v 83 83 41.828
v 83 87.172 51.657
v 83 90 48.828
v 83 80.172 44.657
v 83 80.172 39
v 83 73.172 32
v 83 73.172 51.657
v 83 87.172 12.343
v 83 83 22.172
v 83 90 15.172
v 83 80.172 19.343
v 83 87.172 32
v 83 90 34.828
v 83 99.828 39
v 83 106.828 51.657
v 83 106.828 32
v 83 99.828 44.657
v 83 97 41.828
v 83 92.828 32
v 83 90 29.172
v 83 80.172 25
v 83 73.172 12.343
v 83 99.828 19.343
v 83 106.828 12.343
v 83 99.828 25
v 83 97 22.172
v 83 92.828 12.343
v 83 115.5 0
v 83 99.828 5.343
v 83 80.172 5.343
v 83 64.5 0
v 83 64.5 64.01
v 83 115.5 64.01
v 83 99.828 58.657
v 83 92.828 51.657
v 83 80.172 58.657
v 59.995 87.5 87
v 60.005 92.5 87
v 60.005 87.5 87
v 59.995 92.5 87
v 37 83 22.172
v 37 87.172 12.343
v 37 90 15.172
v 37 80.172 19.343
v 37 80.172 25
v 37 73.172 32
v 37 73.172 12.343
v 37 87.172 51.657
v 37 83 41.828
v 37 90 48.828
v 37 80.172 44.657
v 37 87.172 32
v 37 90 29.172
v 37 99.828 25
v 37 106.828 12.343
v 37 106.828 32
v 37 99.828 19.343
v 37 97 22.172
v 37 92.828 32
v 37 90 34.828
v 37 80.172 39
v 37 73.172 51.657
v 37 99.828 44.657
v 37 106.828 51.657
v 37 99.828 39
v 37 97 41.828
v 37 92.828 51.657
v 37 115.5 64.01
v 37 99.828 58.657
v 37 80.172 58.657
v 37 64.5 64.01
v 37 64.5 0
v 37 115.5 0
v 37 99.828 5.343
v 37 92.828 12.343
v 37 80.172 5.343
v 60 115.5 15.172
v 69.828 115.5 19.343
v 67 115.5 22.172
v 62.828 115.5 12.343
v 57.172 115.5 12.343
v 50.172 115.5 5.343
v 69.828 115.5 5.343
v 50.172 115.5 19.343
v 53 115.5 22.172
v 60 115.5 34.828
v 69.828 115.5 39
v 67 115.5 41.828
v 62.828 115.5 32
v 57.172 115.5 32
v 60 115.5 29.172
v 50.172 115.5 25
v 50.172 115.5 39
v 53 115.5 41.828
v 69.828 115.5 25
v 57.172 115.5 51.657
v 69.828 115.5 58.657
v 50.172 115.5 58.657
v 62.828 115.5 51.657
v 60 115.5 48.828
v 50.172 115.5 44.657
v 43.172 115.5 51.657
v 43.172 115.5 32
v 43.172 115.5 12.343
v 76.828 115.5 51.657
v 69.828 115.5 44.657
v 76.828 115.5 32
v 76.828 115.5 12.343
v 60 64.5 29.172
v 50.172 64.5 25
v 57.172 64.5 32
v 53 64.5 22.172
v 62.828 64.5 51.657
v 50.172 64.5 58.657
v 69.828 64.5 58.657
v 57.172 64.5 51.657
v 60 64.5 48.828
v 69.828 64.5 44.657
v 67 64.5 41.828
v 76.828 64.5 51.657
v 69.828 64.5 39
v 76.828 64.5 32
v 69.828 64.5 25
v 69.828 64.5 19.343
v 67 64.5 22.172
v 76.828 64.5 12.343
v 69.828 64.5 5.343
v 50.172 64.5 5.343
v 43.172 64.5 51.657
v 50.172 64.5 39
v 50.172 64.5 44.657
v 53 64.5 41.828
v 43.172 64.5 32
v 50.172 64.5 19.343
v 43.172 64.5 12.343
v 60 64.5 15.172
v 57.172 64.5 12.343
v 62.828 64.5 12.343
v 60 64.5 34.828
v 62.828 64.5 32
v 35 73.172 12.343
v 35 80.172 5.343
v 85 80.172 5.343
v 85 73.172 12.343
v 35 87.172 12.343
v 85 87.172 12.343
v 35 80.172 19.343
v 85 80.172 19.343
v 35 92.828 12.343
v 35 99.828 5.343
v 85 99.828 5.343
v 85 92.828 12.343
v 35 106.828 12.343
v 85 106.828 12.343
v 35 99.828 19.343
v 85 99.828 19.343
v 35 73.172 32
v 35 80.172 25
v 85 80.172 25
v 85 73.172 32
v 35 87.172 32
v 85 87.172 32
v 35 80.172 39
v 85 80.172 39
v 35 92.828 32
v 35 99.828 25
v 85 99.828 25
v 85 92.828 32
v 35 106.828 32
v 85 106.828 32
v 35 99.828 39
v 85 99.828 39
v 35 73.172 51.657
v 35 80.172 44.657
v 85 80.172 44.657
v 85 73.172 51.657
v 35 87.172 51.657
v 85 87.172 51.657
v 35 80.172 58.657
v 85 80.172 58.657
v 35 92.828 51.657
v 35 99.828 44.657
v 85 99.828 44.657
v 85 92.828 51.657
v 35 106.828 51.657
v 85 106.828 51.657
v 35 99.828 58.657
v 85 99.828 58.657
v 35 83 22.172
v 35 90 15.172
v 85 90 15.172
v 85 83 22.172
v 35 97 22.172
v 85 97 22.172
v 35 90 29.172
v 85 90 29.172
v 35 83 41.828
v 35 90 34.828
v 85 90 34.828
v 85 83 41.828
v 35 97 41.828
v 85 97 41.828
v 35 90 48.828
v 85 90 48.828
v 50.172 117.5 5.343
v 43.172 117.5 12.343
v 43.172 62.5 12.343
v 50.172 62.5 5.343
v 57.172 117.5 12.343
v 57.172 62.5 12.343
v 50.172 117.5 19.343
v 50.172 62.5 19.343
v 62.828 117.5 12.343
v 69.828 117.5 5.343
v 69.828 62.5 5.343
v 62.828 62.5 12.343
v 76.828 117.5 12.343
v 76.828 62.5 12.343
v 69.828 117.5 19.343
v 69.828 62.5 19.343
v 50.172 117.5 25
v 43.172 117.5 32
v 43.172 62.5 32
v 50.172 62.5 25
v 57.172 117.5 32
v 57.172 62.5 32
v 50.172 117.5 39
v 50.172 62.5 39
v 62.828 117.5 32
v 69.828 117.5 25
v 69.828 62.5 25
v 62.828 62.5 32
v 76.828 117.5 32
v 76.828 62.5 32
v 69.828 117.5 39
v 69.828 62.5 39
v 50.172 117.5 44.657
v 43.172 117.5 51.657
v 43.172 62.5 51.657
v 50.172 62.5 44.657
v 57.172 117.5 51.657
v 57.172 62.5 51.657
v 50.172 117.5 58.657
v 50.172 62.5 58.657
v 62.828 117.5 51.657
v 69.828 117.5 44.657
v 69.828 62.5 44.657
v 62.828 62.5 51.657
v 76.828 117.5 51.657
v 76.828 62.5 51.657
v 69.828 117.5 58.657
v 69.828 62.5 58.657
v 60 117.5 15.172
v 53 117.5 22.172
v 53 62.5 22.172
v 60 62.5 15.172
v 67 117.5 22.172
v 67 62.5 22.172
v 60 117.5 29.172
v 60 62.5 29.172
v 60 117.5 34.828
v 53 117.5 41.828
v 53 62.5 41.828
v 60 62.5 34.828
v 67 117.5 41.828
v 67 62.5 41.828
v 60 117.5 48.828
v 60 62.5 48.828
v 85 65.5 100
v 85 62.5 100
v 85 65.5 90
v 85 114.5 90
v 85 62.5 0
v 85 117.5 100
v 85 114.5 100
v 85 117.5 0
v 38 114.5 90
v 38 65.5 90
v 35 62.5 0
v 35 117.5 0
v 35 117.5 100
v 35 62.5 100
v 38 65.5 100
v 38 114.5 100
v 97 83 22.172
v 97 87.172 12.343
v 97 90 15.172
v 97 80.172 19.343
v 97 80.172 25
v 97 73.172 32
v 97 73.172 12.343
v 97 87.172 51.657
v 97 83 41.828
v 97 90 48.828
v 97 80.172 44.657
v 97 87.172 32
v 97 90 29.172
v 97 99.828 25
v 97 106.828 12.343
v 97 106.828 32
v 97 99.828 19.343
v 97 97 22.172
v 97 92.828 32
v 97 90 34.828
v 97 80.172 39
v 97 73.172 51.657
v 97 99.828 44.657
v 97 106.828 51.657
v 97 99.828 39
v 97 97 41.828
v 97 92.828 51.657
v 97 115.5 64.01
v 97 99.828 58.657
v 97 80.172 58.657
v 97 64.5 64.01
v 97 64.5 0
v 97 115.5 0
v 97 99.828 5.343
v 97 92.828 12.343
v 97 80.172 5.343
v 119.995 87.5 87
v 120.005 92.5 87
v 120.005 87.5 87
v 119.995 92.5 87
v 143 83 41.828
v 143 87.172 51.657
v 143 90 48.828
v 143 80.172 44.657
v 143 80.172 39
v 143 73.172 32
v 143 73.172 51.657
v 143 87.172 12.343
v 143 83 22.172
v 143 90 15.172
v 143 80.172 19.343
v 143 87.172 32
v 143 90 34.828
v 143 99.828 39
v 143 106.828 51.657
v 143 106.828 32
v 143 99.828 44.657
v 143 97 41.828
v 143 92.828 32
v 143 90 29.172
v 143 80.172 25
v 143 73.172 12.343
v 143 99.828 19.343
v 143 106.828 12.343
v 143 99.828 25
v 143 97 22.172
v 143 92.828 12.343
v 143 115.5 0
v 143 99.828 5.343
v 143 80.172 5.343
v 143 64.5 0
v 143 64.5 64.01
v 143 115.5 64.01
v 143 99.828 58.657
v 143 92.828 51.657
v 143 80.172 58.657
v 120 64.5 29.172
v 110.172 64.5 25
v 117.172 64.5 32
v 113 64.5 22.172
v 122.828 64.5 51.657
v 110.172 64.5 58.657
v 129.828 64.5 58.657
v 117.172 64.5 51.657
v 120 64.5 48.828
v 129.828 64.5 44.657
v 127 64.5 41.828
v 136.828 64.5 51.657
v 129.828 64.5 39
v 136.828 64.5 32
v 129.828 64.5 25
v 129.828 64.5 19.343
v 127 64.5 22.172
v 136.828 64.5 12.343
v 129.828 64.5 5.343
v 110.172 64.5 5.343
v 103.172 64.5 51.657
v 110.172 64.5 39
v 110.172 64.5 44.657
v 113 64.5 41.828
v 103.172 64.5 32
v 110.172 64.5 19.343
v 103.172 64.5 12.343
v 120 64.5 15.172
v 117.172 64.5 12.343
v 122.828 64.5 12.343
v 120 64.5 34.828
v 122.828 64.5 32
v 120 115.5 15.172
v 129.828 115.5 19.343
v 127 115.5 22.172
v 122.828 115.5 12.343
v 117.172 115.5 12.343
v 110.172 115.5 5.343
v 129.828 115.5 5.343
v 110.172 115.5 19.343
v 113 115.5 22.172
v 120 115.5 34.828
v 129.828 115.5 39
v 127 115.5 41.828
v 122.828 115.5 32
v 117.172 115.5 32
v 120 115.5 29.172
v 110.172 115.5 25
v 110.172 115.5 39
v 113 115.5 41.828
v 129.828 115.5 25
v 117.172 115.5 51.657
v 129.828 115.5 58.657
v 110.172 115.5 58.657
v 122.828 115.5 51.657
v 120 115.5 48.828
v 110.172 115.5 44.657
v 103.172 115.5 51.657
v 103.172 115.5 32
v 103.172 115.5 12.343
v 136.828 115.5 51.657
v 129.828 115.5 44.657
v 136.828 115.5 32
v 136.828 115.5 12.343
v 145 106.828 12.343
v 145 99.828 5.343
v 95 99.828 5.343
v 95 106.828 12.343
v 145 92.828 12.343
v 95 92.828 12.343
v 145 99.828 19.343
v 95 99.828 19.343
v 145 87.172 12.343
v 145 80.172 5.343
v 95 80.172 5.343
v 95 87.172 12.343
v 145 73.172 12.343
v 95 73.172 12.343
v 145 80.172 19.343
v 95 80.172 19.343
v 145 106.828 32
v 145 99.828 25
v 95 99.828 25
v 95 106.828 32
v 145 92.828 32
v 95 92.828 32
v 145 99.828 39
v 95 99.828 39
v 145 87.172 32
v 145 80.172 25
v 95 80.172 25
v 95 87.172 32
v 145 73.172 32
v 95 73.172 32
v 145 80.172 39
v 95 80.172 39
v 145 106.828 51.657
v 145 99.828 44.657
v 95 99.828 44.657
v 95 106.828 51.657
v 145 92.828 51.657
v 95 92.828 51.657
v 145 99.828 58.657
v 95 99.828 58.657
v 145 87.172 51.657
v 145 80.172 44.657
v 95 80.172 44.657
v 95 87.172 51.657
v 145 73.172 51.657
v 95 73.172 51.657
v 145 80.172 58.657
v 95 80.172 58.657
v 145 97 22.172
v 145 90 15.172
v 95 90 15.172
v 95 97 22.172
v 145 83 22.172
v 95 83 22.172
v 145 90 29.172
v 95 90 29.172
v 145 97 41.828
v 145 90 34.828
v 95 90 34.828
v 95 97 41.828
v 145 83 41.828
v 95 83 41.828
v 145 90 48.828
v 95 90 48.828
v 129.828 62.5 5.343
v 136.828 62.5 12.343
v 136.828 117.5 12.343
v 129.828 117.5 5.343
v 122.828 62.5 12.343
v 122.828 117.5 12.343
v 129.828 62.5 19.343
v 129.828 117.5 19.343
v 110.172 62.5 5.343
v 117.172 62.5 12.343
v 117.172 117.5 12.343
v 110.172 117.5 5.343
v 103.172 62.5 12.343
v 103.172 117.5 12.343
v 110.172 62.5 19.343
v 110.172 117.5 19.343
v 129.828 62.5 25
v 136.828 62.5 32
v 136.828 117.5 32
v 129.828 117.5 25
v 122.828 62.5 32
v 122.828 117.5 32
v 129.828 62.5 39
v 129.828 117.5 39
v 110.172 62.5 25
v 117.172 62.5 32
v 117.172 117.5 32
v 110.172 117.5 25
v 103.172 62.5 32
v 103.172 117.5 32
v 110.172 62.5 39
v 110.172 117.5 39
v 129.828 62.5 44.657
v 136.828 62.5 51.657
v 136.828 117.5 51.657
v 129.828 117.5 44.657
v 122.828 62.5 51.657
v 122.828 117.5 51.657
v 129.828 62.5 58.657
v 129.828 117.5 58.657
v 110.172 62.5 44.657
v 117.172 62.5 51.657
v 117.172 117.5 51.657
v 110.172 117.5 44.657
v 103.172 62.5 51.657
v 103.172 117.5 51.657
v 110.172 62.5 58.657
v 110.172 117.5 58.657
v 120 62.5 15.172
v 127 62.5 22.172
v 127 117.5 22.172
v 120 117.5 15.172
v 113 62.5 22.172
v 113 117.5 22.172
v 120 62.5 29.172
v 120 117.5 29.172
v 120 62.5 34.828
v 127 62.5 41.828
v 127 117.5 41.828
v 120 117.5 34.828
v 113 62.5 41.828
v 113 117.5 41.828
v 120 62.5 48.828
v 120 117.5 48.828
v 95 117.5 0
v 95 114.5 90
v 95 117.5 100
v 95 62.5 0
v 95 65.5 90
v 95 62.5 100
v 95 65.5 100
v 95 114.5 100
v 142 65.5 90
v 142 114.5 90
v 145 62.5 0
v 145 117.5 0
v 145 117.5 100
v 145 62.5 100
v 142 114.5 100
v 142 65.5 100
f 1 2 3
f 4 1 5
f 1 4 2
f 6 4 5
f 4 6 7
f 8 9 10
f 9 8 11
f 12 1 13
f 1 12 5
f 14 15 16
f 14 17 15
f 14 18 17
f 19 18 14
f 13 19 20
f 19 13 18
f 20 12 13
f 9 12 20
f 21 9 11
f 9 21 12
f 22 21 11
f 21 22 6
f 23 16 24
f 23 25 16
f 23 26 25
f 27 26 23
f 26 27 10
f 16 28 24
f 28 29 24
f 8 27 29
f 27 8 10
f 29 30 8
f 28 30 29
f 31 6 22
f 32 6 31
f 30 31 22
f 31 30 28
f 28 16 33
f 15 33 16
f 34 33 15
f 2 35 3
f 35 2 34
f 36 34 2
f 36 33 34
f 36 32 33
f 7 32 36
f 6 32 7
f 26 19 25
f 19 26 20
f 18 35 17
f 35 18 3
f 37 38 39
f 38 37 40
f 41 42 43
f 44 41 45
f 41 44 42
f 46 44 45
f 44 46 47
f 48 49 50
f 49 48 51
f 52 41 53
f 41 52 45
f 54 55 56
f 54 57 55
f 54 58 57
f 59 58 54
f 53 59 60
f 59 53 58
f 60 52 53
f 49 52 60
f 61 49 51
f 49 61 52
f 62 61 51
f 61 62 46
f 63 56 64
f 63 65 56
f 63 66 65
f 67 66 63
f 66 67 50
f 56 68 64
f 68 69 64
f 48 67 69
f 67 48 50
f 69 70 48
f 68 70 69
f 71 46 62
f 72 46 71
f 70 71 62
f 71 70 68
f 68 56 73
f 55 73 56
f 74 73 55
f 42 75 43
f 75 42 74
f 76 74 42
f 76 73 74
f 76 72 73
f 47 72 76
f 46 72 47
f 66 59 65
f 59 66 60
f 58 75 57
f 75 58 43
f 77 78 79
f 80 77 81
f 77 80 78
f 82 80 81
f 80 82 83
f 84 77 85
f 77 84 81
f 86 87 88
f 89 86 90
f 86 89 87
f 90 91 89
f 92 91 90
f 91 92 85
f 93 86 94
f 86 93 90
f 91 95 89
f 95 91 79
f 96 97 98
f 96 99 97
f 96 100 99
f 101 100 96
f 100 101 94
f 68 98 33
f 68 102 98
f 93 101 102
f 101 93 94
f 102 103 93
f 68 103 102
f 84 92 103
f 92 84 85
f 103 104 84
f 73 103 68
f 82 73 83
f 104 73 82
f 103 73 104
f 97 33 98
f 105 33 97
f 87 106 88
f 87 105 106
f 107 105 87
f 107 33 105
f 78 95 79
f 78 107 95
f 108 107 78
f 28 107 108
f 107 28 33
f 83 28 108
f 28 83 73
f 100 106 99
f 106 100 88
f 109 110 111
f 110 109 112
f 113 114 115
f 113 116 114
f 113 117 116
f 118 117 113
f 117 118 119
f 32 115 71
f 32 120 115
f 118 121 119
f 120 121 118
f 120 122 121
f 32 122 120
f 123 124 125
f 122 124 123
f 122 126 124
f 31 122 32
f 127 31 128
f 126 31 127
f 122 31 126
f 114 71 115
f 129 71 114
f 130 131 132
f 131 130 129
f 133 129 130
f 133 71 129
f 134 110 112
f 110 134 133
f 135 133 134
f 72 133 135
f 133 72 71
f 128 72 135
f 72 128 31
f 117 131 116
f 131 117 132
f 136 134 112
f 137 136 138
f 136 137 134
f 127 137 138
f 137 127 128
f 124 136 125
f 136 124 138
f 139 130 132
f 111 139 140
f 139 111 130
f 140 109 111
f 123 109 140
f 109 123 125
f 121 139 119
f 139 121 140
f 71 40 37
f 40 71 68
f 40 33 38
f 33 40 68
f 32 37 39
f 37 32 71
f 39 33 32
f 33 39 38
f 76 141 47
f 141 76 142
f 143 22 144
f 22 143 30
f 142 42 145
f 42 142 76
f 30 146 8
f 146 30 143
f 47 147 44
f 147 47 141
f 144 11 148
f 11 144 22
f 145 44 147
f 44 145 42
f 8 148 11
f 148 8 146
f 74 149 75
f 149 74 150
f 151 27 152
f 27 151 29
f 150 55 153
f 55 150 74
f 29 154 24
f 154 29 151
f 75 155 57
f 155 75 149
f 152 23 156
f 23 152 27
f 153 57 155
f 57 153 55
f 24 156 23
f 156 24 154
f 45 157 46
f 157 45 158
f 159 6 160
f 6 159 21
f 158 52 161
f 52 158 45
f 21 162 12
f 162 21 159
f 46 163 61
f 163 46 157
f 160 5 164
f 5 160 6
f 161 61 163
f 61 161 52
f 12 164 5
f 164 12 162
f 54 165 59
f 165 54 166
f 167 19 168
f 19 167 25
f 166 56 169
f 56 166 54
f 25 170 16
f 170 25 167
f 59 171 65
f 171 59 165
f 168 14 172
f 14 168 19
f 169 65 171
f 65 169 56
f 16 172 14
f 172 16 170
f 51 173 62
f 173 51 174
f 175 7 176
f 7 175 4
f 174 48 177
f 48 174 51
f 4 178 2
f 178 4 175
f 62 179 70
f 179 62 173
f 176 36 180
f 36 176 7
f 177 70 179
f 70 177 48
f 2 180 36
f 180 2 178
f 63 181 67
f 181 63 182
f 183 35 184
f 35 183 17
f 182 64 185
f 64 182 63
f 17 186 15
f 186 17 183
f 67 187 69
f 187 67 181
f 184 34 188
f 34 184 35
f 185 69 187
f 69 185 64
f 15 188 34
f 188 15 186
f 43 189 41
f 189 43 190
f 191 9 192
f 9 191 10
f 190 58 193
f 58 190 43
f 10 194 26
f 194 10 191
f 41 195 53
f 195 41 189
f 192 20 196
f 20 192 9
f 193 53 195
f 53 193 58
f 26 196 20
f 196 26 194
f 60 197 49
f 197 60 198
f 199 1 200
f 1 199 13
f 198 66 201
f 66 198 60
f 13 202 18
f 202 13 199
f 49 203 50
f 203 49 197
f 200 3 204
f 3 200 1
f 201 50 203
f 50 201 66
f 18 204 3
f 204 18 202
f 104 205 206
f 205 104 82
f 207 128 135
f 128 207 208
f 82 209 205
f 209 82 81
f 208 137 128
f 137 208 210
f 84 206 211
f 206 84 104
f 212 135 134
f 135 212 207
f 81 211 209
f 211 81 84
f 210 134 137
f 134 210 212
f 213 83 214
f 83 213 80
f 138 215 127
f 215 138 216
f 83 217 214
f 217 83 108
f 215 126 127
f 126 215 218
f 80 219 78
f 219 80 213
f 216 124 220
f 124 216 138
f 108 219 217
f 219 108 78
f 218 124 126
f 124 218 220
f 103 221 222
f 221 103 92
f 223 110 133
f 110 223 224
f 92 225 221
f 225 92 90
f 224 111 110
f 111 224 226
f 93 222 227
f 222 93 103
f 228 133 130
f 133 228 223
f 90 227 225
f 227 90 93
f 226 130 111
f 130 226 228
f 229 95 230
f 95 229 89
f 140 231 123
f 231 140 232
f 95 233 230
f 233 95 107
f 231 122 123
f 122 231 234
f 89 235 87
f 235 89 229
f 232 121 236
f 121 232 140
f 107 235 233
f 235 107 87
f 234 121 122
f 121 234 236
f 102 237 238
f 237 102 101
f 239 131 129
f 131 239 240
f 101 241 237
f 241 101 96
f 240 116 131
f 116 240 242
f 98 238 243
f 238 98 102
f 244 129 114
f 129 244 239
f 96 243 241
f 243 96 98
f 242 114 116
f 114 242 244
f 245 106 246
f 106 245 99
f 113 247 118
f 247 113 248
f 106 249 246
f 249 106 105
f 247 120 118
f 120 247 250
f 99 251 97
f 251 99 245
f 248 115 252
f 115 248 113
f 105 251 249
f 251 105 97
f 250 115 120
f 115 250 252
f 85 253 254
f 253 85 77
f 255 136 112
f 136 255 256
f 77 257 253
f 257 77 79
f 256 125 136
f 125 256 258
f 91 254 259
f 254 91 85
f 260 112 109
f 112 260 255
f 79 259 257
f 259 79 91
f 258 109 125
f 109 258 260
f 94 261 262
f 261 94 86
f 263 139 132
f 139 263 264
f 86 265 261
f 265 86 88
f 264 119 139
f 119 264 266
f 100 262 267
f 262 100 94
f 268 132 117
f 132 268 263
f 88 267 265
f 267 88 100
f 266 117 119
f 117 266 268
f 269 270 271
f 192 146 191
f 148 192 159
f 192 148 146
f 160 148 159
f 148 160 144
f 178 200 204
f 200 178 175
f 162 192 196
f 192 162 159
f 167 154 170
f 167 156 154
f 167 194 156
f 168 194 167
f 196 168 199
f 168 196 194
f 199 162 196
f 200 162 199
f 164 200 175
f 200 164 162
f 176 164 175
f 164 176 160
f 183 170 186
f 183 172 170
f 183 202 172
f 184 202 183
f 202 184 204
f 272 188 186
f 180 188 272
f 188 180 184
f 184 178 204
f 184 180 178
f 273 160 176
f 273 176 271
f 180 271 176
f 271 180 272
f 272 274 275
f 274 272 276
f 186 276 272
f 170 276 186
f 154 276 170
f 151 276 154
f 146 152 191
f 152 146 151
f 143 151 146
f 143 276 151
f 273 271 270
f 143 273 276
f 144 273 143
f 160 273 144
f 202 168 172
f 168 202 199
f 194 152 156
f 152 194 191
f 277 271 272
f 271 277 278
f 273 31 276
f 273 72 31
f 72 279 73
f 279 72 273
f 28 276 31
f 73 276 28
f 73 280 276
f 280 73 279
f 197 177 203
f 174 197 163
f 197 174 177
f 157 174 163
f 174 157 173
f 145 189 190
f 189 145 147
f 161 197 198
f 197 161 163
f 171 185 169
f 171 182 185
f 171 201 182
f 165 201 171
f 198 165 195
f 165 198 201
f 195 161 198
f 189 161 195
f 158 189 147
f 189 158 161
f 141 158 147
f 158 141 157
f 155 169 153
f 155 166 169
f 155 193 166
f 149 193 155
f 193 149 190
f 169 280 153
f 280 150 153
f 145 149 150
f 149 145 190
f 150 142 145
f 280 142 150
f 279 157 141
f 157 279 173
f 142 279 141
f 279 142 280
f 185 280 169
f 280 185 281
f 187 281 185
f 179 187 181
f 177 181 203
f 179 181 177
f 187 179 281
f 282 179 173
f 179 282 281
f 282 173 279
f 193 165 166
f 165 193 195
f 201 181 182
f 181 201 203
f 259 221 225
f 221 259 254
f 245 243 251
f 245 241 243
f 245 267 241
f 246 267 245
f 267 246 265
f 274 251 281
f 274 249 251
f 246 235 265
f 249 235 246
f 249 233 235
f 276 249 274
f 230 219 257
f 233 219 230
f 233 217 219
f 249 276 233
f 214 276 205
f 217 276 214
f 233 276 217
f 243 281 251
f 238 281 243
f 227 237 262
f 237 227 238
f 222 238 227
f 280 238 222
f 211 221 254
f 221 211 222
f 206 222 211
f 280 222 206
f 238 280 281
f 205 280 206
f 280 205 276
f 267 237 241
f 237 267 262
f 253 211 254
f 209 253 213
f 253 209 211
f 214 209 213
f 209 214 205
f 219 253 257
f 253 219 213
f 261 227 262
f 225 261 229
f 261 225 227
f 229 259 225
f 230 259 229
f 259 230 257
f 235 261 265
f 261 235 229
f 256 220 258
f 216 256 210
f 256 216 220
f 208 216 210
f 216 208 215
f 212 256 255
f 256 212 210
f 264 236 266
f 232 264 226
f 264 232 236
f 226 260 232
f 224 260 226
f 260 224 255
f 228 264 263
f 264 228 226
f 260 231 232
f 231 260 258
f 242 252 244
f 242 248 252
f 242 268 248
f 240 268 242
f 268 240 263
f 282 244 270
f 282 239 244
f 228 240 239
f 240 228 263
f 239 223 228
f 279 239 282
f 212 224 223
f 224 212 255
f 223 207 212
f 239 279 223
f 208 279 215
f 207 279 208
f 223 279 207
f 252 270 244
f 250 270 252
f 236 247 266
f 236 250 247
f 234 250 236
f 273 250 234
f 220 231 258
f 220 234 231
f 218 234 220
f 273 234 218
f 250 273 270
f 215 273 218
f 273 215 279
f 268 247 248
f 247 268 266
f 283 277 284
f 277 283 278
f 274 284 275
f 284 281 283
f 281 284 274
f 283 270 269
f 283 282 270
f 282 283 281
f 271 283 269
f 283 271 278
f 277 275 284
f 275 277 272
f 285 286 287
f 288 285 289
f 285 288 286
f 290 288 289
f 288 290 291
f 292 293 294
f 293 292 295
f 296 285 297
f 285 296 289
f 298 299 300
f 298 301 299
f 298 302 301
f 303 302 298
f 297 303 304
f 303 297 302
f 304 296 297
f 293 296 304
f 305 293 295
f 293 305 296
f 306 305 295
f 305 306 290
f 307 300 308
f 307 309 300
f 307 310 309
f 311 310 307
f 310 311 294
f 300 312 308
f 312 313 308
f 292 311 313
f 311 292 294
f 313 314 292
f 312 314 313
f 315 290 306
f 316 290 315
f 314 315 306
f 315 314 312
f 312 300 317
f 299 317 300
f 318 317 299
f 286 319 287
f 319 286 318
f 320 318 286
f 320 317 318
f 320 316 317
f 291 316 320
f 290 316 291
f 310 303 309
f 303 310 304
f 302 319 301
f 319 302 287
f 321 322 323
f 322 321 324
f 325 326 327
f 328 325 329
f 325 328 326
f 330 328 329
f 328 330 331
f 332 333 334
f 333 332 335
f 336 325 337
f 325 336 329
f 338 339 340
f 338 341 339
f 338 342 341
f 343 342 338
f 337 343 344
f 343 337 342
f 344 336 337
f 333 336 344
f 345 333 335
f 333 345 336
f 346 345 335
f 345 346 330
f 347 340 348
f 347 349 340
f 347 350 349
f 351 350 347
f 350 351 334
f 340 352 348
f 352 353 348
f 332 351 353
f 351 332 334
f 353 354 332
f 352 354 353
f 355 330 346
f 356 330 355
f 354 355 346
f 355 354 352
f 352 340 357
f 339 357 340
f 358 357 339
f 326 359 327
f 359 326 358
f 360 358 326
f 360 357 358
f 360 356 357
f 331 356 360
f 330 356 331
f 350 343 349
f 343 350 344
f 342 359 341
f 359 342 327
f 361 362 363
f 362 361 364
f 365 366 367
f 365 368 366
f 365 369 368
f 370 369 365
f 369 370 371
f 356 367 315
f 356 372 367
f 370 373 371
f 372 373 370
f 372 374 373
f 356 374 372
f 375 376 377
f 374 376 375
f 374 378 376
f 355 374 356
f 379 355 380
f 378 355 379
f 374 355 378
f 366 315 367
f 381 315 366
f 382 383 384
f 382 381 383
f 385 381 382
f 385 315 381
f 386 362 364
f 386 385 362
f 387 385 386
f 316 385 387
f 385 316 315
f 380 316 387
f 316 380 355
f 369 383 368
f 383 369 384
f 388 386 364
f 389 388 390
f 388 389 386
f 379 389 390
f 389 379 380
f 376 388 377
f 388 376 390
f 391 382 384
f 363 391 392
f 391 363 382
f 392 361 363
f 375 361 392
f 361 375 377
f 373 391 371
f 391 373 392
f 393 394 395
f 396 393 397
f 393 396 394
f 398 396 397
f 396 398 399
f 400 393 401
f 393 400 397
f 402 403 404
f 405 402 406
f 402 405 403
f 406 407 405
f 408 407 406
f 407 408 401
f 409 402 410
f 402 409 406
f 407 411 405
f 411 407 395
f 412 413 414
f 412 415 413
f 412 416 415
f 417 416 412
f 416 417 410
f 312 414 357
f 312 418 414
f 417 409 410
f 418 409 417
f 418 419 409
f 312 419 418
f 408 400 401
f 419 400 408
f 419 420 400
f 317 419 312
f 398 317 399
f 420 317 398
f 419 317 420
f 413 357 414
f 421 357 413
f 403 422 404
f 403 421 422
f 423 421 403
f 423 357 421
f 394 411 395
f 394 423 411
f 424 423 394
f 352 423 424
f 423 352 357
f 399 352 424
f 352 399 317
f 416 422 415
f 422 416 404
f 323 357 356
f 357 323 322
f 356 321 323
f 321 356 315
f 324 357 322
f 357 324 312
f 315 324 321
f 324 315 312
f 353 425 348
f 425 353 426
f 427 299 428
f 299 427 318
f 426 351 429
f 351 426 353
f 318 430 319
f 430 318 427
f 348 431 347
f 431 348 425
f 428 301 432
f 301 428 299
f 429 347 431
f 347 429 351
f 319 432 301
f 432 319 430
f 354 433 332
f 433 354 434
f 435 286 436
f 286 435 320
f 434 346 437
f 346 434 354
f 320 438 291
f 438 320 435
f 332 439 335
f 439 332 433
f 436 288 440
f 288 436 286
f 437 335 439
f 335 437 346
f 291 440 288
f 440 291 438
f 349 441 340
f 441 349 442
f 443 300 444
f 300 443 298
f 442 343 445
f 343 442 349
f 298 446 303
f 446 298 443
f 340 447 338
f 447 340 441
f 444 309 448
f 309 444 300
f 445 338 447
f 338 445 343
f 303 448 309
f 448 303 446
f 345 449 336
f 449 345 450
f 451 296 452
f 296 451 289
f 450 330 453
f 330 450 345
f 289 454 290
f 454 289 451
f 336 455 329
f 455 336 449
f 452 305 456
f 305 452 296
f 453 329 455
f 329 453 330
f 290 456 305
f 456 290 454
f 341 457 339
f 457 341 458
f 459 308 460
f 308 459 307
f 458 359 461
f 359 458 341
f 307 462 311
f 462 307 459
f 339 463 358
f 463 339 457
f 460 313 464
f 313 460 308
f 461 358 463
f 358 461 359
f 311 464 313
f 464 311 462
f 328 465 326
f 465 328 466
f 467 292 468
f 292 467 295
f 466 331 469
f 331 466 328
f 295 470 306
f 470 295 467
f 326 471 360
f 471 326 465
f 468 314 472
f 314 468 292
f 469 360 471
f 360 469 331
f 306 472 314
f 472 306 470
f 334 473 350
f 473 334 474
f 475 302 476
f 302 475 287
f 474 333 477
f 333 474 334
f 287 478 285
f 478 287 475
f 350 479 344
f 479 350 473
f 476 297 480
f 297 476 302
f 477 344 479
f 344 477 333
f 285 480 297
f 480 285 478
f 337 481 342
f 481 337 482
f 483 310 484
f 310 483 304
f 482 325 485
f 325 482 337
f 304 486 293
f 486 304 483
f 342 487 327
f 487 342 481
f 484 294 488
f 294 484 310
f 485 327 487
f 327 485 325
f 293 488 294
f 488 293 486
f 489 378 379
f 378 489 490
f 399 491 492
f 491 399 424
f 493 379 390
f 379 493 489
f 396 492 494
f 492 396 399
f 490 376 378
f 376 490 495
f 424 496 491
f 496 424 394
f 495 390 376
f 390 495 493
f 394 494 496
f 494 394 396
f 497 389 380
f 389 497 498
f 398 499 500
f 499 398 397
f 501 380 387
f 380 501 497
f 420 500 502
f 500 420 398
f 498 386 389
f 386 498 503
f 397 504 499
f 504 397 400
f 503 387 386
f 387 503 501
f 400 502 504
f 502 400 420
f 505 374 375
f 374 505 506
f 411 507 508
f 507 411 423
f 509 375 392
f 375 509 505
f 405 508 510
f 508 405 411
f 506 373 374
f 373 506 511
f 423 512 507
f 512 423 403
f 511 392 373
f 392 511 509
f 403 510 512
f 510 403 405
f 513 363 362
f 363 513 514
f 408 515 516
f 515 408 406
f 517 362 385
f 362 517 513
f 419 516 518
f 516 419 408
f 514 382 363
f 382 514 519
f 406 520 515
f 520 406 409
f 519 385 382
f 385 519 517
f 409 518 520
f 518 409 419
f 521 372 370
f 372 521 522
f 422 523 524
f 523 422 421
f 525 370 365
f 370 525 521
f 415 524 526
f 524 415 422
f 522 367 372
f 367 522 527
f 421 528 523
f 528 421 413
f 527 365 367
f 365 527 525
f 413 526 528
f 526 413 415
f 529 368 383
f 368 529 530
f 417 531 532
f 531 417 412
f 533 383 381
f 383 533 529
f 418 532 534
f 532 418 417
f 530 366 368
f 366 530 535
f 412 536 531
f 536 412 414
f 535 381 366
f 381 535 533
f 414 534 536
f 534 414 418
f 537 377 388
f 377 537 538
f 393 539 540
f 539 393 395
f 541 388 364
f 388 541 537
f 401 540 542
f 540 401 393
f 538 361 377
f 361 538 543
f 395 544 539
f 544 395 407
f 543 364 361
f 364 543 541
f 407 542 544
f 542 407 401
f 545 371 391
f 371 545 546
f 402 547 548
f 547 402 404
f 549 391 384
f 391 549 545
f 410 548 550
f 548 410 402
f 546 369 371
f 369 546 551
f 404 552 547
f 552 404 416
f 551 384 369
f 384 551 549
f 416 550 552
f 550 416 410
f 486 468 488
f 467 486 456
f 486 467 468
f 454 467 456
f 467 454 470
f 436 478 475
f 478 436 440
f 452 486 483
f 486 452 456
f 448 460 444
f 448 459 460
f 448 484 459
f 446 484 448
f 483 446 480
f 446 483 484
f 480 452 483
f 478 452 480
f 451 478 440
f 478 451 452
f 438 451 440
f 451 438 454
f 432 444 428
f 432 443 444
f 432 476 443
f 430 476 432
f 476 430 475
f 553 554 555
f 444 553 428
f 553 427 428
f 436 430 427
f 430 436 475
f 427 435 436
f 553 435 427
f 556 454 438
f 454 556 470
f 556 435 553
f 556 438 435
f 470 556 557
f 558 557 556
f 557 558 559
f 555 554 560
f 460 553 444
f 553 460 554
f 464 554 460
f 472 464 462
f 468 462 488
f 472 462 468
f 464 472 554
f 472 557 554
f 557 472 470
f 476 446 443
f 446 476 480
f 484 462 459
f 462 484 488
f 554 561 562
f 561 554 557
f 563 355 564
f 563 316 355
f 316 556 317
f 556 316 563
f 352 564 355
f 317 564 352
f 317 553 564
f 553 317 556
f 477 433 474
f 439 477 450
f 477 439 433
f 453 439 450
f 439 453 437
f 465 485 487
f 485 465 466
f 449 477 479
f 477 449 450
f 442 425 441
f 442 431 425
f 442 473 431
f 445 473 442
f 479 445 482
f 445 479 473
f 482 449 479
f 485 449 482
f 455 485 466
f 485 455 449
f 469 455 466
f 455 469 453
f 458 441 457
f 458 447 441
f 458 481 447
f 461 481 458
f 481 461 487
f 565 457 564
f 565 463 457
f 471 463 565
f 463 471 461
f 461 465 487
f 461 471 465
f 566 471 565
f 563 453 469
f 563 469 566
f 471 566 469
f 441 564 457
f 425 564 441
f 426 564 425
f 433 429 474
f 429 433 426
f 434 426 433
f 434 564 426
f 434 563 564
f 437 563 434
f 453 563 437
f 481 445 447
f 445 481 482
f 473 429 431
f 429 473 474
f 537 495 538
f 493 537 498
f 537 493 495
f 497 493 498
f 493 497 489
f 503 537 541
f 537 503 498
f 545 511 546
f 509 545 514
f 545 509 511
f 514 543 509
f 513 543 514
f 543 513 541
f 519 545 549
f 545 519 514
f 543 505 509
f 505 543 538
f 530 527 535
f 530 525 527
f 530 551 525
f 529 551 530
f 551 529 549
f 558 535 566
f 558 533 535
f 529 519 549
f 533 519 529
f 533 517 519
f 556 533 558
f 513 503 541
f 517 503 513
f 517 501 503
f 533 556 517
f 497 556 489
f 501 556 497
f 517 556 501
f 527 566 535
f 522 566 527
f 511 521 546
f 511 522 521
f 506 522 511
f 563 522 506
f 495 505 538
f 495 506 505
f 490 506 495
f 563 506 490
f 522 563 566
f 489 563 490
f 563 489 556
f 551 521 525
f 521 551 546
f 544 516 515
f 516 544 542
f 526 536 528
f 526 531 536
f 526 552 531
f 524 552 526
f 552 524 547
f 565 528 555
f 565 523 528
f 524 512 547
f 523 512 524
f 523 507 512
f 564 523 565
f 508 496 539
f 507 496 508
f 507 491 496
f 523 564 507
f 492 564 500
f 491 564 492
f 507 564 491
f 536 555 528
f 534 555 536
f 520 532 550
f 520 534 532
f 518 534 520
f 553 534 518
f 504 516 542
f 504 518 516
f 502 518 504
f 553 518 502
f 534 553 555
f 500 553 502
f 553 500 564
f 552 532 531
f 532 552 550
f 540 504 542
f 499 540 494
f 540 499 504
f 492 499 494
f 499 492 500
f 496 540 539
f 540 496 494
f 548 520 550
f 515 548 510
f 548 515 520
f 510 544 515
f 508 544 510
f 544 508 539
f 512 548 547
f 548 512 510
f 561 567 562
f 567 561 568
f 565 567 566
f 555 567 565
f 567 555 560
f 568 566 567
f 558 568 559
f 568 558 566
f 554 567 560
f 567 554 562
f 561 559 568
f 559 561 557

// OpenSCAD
// 箱型の物を左右2本で支える足
// 天面のコの字壁で載せた物の長辺方向・短辺方向のズレを止める。中央側は開放。
// 柱は中空にし、4面の壁に菱形の窓を開けてフィラメントを節約する。
// 窓の上辺・内部天井はすべて45°なので、サポートなしで造形できる。
//
// 座標系: 足1本の外側端 (コの字の閉じた側) の手前下角を原点とし、
//   X=載せる物の長辺方向 (+Xが中央側), Y=短辺方向, Z=上

/* [出力] */
// pair は左右2本を向かい合わせて A1 mini のプレートに並べた印刷用配置。左右の足は同一形状
part = "pair"; // [pair:2本並べて印刷, leg:1本, assembled:組立確認]

/* [載せる物の底面 mm] */
// 長辺 (足と足の間隔を決める)
item_length = 290; // [100:1:600]
// 短辺
item_width = 48; // [20:0.5:150]
// 載せる物とコの字壁の隙間 (片側)
clearance = 0.5; // [0:0.1:2]

/* [足の寸法 mm] */
// 床から載せる物の底面までの高さ
leg_height = 90; // [20:1:150]
// 長辺方向に支える長さ (コの字壁を含む)
leg_length = 50; // [20:1:80]

/* [ズレ止めの壁 mm] */
guide_height = 10; // [0:1:30]
guide_thickness = 3; // [1.2:0.2:8]

/* [構造 mm] */
// 柱の壁厚
shell_thickness = 2; // [1.2:0.2:5]
// 天板の厚さ
top_thickness = 3; // [1.2:0.2:8]
// 底面の外周に張り出すフランジ幅 (ベッドから剥がれやすい場合に使う。0で無し)
foot_flange = 0; // [0:0.5:10]

/* [菱形窓] */
windows = true;
// 菱形の対角長
window_size = 14; // [6:1:40]
// 窓と窓の間に残す桟の幅
window_strut = 4; // [2:0.5:10]
// 柱の角・下端・天井の立ち上がりから窓までの余白
window_edge = 5; // [2:0.5:15]

/* [Hidden] */
eps = 0.01;
pair_gap = 10;
plate_size = 180;  // A1 mini のビルドプレート
flange_thickness = 1;
item_preview_height = 40;

outer_w = item_width + clearance * 2 + guide_thickness * 2;
ceiling_z = leg_height - top_thickness;
in_x = leg_length - shell_thickness * 2;
in_y = outer_w - shell_thickness * 2;
// 内部天井は45°の寄棟にし、天板の下面をブリッジなしで支える
roof_h = min(in_x, in_y) / 2;
roof_start_z = ceiling_z - roof_h;
ridge_x = max(in_x - roof_h * 2, eps);
ridge_y = max(in_y - roof_h * 2, eps);

window_pitch = window_size + window_strut * sqrt(2);
window_margin = max(window_edge, shell_thickness + 1);
window_z_lo = window_edge + (foot_flange > 0 ? flange_thickness : 0);
window_z_hi = min(roof_start_z, ceiling_z) - window_edge;

module diamond_prism(depth) {
  rotate([90, 0, 0])
    linear_extrude(height = depth, center = true)
      polygon([
        [0, -window_size / 2],
        [window_size / 2, 0],
        [0, window_size / 2],
        [-window_size / 2, 0]
      ]);
}

// 幅face_wの面に、千鳥配置の菱形窓を並べる (面の左端がu=0、厚さ方向は中央)
module window_pattern(face_w, depth) {
  avail_u = face_w - window_margin * 2;
  avail_z = window_z_hi - window_z_lo;
  n_a = avail_u >= window_size ? floor((avail_u - window_size) / window_pitch) + 1 : 0;
  n_b = n_a - 1;
  rows_raw = avail_z >= window_size ? floor((avail_z - window_size) / (window_pitch / 2)) + 1 : 0;
  // 千鳥の偶数行に窓が入らない場合は、最終行が奇数行で終わるよう揃える
  n_rows = n_b > 0 ? rows_raw : (rows_raw > 0 ? floor((rows_raw - 1) / 2) * 2 + 1 : 0);
  span_z = window_size + (n_rows - 1) * window_pitch / 2;
  z0 = window_z_lo + (avail_z - span_z) / 2 + window_size / 2;
  if (n_a > 0 && n_rows > 0) {
    for (j = [0:n_rows - 1]) {
      n = j % 2 == 0 ? n_a : n_b;
      if (n > 0) {
        for (i = [0:n - 1]) {
          translate([face_w / 2 + (i - (n - 1) / 2) * window_pitch, 0, z0 + j * window_pitch / 2])
            diamond_prism(depth);
        }
      }
    }
  }
}

module inner_void() {
  intersection() {
    translate([shell_thickness, shell_thickness, -1])
      cube([in_x, in_y, ceiling_z + 1]);
    hull() {
      translate([shell_thickness, shell_thickness, min(roof_start_z, -1)])
        cube([in_x, in_y, eps]);
      translate([shell_thickness, shell_thickness, roof_start_z])
        cube([in_x, in_y, eps]);
      translate([leg_length / 2 - ridge_x / 2, outer_w / 2 - ridge_y / 2, ceiling_z - eps])
        cube([ridge_x, ridge_y, eps]);
    }
  }
}

module guide_walls() {
  if (guide_height > 0) {
    translate([0, 0, leg_height]) {
      cube([guide_thickness, outer_w, guide_height]);
      cube([leg_length, guide_thickness, guide_height]);
      translate([0, outer_w - guide_thickness, 0])
        cube([leg_length, guide_thickness, guide_height]);
    }
  }
}

module leg() {
  difference() {
    union() {
      cube([leg_length, outer_w, leg_height]);
      if (foot_flange > 0) {
        translate([-foot_flange, -foot_flange, 0])
          cube([leg_length + foot_flange * 2, outer_w + foot_flange * 2, flange_thickness]);
      }
    }
    inner_void();
    if (windows) {
      // 短辺側の面 (外側端と中央側)。窓は柱を貫通させ、両面を同時に抜く
      translate([leg_length / 2, 0, 0])
        rotate([0, 0, 90])
          window_pattern(outer_w, leg_length + foot_flange * 2 + 2);
      // 長辺側の面
      translate([0, outer_w / 2, 0])
        window_pattern(leg_length, outer_w + foot_flange * 2 + 2);
    }
  }
  guide_walls();
}

module model() {
  if (part == "leg") {
    leg();
  } else if (part == "assembled") {
    // 左右の足は同一形状。右側は中央側に向けて鏡映配置する
    x_outer = item_length / 2 + clearance + guide_thickness;
    translate([-x_outer, -outer_w / 2, 0])
      leg();
    mirror([1, 0, 0])
      translate([-x_outer, -outer_w / 2, 0])
        leg();
    %translate([-item_length / 2, -item_width / 2, leg_height])
      cube([item_length, item_width, item_preview_height]);
  }
}

// pair は A1 mini のプレート中央に、コの字の開いた側を向かい合わせて並べる
// --enable=lazy-union で 3MF に出すと足ごとに別オブジェクトになるよう、トップレベルに並べる
pair_pitch = leg_length + foot_flange * 2 + pair_gap;
pair_x0 = plate_size / 2 - (pair_pitch + leg_length) / 2;
pair_y0 = plate_size / 2 - outer_w / 2;
if (part == "pair") {
  translate([pair_x0, pair_y0, 0])
    leg();
  translate([pair_x0 + pair_pitch + leg_length, pair_y0 + outer_w, 0])
    rotate([0, 0, 180])
      leg();
}

model();
